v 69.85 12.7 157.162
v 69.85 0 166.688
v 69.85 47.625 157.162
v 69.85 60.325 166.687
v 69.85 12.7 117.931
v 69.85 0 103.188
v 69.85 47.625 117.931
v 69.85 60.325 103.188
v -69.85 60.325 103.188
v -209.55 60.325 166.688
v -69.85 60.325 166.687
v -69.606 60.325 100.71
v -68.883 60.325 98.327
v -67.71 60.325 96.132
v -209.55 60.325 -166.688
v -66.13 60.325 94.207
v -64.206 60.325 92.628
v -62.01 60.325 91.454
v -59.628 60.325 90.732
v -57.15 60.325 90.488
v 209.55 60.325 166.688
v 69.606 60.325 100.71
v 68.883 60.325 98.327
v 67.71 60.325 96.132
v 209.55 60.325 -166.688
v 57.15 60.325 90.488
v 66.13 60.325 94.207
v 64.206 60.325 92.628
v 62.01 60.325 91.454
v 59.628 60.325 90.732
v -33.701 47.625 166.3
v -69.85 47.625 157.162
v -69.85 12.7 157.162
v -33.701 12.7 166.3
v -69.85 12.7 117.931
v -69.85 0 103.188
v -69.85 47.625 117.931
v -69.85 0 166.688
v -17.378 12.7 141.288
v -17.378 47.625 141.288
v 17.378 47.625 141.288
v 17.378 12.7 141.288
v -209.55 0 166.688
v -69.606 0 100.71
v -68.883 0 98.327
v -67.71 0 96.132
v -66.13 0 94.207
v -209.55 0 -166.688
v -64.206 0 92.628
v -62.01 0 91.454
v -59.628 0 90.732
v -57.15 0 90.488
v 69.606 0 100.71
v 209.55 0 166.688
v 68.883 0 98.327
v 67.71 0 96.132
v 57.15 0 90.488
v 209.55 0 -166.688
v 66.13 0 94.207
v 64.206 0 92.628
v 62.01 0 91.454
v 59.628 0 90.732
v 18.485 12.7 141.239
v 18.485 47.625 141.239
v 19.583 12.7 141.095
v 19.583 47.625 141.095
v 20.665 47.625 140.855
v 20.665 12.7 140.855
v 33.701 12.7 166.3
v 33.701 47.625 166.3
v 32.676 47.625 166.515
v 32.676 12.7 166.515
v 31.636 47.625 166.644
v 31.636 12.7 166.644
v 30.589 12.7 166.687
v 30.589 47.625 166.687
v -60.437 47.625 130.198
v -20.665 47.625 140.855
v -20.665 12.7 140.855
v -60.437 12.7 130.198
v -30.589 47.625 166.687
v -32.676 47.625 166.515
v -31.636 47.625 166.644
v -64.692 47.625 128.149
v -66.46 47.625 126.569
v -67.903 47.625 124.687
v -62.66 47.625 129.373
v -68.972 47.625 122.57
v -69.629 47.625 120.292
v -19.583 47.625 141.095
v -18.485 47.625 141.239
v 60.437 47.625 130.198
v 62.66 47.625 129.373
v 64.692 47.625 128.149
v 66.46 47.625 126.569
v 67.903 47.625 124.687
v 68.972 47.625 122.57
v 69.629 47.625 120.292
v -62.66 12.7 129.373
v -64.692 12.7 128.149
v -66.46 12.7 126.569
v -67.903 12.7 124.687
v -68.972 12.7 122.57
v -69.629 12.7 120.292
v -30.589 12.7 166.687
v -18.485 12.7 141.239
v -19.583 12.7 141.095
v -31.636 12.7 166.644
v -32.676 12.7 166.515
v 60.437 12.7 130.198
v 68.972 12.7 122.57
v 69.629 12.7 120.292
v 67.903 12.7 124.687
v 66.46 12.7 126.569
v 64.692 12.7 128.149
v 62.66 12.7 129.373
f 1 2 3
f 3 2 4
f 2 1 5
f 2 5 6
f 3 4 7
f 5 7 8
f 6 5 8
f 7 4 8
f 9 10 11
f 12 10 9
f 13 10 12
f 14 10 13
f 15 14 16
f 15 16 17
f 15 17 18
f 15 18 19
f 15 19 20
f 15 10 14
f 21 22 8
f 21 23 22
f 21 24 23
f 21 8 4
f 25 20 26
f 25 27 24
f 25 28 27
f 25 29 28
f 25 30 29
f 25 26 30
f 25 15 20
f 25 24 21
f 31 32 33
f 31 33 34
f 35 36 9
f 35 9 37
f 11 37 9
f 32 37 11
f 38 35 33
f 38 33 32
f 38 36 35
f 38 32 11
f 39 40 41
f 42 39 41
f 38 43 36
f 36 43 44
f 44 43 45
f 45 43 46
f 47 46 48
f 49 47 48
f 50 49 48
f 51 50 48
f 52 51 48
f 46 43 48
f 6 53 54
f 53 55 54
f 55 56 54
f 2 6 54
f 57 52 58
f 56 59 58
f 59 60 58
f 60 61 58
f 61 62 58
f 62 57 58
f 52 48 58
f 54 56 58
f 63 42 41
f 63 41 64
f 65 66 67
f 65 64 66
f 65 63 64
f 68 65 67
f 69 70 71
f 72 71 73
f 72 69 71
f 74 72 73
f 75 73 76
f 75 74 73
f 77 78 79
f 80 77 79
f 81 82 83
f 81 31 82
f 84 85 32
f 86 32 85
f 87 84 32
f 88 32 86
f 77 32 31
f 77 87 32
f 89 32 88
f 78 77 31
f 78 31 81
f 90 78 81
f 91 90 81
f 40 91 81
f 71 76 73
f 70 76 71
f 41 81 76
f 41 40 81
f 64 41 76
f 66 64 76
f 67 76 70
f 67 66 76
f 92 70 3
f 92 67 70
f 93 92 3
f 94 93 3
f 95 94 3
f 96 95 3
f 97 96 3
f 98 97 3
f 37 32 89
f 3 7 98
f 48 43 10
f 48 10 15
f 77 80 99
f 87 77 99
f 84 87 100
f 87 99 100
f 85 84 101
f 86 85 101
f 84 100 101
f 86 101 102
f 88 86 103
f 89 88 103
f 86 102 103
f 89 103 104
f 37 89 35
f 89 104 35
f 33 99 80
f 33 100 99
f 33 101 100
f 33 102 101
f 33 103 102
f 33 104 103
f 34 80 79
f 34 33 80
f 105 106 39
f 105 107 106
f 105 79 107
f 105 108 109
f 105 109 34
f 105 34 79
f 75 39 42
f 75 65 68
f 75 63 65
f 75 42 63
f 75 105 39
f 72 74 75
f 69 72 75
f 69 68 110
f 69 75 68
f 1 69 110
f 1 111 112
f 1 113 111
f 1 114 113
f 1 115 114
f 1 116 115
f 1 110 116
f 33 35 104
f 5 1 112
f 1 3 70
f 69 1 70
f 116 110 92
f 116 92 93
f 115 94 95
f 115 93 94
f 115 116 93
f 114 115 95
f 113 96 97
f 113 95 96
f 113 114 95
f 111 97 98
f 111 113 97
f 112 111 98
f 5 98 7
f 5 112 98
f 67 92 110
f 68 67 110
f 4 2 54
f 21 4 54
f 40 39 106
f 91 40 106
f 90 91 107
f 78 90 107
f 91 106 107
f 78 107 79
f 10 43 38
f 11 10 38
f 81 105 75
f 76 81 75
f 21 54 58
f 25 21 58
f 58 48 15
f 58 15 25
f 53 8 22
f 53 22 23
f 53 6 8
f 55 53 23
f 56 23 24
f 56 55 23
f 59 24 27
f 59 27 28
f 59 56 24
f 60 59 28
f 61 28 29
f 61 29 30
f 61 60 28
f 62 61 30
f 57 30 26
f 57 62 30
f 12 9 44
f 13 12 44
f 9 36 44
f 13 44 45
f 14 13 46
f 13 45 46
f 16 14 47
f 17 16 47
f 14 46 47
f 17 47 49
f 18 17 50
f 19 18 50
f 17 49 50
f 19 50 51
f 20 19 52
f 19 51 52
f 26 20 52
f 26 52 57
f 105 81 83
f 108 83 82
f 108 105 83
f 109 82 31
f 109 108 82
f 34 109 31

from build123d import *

# Parameters (mm, degrees)
SKETCH1_W           = 419.1
SKETCH1_H           = 333.375
BOSS_EXTRUDE1_DEPTH = 60.325
SKETCH2_W           = 139.7
SKETCH2_H           = 50.8
CUT_EXTRUDE1_DEPTH  = 61.325
CHAMFER1_SIZE       = 50.8
CHAMFER1_SIZE2      = 13.611818976
FILLET1_R           = 12.7
SKETCH3_W           = 139.7
SKETCH3_H           = 56.403006085
CUT_EXTRUDE2_DEPTH  = 12.7
SKETCH4_W           = 139.7
SKETCH4_H           = 56.128435861
CUT_EXTRUDE3_DEPTH  = 12.7


with BuildPart() as part:
    # Sketch1 → Boss-Extrude1 (new body)
    with BuildSketch(Plane(origin=(0, 0, 0), x_dir=(1, 0, 0), z_dir=(0, 1, 0))):
        Rectangle(SKETCH1_W, SKETCH1_H)
    extrude(amount=BOSS_EXTRUDE1_DEPTH)

    # Sketch2 → Cut-Extrude1 (cut, through all)
    with BuildSketch(Plane(origin=(0, 60.325, 0), x_dir=(1, 0, 0), z_dir=(0, 1, 0))):
        with Locations((0, -115.8875)):
            Rectangle(SKETCH2_W, SKETCH2_H)
        Polygon((-69.85, -166.6875), (-69.85, -157.1625), (-32.169017961, -166.6875), align=None)
        Polygon((32.169017961, -166.6875), (69.85, -166.6875), (69.85, -157.1625), align=None)
    extrude(amount=-CUT_EXTRUDE1_DEPTH, mode=Mode.SUBTRACT)

    # Chamfer1
    chamfer1_edges = [part.edges().sort_by_distance(p)[0] for p in [
        (69.85, 30.1625, 141.2875),
        (-69.85, 30.1625, 141.2875),
    ]]
    chamfer1_side = [part.faces().sort_by_distance(p)[0] for p in [
        (0, 30.1625, 141.2875),
    ]]
    chamfer(chamfer1_edges, length=CHAMFER1_SIZE, length2=CHAMFER1_SIZE2, reference=chamfer1_side[0])

    # Fillet1
    fillet1_edges = [part.edges().sort_by_distance(p)[0] for p in [
        (69.85, 30.1625, 90.4875),
        (-69.85, 30.1625, 90.4875),
        (-32.169017961, 30.1625, 166.6875),
        (32.169017961, 30.1625, 166.6875),
        (69.85, 30.1625, 127.675681024),
        (-19.05, 30.1625, 141.2875),
        (19.05, 30.1625, 141.2875),
        (-69.85, 30.1625, 127.675681024),
    ]]
    fillet(fillet1_edges, radius=FILLET1_R)

    # Sketch3 → Cut-Extrude2 (cut)
    with BuildSketch(Plane(origin=(0, 60.325, 0), x_dir=(1, 0, 0), z_dir=(0, 1, 0))):
        with Locations((0, -138.485996957)):
            Rectangle(SKETCH3_W, SKETCH3_H)
    extrude(amount=-CUT_EXTRUDE2_DEPTH, mode=Mode.SUBTRACT)

    # Sketch4 → Cut-Extrude3 (cut)
    with BuildSketch(Plane.XZ):
        with Locations((0, 138.623282069)):
            Rectangle(SKETCH4_W, SKETCH4_H)
    extrude(amount=-CUT_EXTRUDE3_DEPTH, mode=Mode.SUBTRACT)


solid = part.part
